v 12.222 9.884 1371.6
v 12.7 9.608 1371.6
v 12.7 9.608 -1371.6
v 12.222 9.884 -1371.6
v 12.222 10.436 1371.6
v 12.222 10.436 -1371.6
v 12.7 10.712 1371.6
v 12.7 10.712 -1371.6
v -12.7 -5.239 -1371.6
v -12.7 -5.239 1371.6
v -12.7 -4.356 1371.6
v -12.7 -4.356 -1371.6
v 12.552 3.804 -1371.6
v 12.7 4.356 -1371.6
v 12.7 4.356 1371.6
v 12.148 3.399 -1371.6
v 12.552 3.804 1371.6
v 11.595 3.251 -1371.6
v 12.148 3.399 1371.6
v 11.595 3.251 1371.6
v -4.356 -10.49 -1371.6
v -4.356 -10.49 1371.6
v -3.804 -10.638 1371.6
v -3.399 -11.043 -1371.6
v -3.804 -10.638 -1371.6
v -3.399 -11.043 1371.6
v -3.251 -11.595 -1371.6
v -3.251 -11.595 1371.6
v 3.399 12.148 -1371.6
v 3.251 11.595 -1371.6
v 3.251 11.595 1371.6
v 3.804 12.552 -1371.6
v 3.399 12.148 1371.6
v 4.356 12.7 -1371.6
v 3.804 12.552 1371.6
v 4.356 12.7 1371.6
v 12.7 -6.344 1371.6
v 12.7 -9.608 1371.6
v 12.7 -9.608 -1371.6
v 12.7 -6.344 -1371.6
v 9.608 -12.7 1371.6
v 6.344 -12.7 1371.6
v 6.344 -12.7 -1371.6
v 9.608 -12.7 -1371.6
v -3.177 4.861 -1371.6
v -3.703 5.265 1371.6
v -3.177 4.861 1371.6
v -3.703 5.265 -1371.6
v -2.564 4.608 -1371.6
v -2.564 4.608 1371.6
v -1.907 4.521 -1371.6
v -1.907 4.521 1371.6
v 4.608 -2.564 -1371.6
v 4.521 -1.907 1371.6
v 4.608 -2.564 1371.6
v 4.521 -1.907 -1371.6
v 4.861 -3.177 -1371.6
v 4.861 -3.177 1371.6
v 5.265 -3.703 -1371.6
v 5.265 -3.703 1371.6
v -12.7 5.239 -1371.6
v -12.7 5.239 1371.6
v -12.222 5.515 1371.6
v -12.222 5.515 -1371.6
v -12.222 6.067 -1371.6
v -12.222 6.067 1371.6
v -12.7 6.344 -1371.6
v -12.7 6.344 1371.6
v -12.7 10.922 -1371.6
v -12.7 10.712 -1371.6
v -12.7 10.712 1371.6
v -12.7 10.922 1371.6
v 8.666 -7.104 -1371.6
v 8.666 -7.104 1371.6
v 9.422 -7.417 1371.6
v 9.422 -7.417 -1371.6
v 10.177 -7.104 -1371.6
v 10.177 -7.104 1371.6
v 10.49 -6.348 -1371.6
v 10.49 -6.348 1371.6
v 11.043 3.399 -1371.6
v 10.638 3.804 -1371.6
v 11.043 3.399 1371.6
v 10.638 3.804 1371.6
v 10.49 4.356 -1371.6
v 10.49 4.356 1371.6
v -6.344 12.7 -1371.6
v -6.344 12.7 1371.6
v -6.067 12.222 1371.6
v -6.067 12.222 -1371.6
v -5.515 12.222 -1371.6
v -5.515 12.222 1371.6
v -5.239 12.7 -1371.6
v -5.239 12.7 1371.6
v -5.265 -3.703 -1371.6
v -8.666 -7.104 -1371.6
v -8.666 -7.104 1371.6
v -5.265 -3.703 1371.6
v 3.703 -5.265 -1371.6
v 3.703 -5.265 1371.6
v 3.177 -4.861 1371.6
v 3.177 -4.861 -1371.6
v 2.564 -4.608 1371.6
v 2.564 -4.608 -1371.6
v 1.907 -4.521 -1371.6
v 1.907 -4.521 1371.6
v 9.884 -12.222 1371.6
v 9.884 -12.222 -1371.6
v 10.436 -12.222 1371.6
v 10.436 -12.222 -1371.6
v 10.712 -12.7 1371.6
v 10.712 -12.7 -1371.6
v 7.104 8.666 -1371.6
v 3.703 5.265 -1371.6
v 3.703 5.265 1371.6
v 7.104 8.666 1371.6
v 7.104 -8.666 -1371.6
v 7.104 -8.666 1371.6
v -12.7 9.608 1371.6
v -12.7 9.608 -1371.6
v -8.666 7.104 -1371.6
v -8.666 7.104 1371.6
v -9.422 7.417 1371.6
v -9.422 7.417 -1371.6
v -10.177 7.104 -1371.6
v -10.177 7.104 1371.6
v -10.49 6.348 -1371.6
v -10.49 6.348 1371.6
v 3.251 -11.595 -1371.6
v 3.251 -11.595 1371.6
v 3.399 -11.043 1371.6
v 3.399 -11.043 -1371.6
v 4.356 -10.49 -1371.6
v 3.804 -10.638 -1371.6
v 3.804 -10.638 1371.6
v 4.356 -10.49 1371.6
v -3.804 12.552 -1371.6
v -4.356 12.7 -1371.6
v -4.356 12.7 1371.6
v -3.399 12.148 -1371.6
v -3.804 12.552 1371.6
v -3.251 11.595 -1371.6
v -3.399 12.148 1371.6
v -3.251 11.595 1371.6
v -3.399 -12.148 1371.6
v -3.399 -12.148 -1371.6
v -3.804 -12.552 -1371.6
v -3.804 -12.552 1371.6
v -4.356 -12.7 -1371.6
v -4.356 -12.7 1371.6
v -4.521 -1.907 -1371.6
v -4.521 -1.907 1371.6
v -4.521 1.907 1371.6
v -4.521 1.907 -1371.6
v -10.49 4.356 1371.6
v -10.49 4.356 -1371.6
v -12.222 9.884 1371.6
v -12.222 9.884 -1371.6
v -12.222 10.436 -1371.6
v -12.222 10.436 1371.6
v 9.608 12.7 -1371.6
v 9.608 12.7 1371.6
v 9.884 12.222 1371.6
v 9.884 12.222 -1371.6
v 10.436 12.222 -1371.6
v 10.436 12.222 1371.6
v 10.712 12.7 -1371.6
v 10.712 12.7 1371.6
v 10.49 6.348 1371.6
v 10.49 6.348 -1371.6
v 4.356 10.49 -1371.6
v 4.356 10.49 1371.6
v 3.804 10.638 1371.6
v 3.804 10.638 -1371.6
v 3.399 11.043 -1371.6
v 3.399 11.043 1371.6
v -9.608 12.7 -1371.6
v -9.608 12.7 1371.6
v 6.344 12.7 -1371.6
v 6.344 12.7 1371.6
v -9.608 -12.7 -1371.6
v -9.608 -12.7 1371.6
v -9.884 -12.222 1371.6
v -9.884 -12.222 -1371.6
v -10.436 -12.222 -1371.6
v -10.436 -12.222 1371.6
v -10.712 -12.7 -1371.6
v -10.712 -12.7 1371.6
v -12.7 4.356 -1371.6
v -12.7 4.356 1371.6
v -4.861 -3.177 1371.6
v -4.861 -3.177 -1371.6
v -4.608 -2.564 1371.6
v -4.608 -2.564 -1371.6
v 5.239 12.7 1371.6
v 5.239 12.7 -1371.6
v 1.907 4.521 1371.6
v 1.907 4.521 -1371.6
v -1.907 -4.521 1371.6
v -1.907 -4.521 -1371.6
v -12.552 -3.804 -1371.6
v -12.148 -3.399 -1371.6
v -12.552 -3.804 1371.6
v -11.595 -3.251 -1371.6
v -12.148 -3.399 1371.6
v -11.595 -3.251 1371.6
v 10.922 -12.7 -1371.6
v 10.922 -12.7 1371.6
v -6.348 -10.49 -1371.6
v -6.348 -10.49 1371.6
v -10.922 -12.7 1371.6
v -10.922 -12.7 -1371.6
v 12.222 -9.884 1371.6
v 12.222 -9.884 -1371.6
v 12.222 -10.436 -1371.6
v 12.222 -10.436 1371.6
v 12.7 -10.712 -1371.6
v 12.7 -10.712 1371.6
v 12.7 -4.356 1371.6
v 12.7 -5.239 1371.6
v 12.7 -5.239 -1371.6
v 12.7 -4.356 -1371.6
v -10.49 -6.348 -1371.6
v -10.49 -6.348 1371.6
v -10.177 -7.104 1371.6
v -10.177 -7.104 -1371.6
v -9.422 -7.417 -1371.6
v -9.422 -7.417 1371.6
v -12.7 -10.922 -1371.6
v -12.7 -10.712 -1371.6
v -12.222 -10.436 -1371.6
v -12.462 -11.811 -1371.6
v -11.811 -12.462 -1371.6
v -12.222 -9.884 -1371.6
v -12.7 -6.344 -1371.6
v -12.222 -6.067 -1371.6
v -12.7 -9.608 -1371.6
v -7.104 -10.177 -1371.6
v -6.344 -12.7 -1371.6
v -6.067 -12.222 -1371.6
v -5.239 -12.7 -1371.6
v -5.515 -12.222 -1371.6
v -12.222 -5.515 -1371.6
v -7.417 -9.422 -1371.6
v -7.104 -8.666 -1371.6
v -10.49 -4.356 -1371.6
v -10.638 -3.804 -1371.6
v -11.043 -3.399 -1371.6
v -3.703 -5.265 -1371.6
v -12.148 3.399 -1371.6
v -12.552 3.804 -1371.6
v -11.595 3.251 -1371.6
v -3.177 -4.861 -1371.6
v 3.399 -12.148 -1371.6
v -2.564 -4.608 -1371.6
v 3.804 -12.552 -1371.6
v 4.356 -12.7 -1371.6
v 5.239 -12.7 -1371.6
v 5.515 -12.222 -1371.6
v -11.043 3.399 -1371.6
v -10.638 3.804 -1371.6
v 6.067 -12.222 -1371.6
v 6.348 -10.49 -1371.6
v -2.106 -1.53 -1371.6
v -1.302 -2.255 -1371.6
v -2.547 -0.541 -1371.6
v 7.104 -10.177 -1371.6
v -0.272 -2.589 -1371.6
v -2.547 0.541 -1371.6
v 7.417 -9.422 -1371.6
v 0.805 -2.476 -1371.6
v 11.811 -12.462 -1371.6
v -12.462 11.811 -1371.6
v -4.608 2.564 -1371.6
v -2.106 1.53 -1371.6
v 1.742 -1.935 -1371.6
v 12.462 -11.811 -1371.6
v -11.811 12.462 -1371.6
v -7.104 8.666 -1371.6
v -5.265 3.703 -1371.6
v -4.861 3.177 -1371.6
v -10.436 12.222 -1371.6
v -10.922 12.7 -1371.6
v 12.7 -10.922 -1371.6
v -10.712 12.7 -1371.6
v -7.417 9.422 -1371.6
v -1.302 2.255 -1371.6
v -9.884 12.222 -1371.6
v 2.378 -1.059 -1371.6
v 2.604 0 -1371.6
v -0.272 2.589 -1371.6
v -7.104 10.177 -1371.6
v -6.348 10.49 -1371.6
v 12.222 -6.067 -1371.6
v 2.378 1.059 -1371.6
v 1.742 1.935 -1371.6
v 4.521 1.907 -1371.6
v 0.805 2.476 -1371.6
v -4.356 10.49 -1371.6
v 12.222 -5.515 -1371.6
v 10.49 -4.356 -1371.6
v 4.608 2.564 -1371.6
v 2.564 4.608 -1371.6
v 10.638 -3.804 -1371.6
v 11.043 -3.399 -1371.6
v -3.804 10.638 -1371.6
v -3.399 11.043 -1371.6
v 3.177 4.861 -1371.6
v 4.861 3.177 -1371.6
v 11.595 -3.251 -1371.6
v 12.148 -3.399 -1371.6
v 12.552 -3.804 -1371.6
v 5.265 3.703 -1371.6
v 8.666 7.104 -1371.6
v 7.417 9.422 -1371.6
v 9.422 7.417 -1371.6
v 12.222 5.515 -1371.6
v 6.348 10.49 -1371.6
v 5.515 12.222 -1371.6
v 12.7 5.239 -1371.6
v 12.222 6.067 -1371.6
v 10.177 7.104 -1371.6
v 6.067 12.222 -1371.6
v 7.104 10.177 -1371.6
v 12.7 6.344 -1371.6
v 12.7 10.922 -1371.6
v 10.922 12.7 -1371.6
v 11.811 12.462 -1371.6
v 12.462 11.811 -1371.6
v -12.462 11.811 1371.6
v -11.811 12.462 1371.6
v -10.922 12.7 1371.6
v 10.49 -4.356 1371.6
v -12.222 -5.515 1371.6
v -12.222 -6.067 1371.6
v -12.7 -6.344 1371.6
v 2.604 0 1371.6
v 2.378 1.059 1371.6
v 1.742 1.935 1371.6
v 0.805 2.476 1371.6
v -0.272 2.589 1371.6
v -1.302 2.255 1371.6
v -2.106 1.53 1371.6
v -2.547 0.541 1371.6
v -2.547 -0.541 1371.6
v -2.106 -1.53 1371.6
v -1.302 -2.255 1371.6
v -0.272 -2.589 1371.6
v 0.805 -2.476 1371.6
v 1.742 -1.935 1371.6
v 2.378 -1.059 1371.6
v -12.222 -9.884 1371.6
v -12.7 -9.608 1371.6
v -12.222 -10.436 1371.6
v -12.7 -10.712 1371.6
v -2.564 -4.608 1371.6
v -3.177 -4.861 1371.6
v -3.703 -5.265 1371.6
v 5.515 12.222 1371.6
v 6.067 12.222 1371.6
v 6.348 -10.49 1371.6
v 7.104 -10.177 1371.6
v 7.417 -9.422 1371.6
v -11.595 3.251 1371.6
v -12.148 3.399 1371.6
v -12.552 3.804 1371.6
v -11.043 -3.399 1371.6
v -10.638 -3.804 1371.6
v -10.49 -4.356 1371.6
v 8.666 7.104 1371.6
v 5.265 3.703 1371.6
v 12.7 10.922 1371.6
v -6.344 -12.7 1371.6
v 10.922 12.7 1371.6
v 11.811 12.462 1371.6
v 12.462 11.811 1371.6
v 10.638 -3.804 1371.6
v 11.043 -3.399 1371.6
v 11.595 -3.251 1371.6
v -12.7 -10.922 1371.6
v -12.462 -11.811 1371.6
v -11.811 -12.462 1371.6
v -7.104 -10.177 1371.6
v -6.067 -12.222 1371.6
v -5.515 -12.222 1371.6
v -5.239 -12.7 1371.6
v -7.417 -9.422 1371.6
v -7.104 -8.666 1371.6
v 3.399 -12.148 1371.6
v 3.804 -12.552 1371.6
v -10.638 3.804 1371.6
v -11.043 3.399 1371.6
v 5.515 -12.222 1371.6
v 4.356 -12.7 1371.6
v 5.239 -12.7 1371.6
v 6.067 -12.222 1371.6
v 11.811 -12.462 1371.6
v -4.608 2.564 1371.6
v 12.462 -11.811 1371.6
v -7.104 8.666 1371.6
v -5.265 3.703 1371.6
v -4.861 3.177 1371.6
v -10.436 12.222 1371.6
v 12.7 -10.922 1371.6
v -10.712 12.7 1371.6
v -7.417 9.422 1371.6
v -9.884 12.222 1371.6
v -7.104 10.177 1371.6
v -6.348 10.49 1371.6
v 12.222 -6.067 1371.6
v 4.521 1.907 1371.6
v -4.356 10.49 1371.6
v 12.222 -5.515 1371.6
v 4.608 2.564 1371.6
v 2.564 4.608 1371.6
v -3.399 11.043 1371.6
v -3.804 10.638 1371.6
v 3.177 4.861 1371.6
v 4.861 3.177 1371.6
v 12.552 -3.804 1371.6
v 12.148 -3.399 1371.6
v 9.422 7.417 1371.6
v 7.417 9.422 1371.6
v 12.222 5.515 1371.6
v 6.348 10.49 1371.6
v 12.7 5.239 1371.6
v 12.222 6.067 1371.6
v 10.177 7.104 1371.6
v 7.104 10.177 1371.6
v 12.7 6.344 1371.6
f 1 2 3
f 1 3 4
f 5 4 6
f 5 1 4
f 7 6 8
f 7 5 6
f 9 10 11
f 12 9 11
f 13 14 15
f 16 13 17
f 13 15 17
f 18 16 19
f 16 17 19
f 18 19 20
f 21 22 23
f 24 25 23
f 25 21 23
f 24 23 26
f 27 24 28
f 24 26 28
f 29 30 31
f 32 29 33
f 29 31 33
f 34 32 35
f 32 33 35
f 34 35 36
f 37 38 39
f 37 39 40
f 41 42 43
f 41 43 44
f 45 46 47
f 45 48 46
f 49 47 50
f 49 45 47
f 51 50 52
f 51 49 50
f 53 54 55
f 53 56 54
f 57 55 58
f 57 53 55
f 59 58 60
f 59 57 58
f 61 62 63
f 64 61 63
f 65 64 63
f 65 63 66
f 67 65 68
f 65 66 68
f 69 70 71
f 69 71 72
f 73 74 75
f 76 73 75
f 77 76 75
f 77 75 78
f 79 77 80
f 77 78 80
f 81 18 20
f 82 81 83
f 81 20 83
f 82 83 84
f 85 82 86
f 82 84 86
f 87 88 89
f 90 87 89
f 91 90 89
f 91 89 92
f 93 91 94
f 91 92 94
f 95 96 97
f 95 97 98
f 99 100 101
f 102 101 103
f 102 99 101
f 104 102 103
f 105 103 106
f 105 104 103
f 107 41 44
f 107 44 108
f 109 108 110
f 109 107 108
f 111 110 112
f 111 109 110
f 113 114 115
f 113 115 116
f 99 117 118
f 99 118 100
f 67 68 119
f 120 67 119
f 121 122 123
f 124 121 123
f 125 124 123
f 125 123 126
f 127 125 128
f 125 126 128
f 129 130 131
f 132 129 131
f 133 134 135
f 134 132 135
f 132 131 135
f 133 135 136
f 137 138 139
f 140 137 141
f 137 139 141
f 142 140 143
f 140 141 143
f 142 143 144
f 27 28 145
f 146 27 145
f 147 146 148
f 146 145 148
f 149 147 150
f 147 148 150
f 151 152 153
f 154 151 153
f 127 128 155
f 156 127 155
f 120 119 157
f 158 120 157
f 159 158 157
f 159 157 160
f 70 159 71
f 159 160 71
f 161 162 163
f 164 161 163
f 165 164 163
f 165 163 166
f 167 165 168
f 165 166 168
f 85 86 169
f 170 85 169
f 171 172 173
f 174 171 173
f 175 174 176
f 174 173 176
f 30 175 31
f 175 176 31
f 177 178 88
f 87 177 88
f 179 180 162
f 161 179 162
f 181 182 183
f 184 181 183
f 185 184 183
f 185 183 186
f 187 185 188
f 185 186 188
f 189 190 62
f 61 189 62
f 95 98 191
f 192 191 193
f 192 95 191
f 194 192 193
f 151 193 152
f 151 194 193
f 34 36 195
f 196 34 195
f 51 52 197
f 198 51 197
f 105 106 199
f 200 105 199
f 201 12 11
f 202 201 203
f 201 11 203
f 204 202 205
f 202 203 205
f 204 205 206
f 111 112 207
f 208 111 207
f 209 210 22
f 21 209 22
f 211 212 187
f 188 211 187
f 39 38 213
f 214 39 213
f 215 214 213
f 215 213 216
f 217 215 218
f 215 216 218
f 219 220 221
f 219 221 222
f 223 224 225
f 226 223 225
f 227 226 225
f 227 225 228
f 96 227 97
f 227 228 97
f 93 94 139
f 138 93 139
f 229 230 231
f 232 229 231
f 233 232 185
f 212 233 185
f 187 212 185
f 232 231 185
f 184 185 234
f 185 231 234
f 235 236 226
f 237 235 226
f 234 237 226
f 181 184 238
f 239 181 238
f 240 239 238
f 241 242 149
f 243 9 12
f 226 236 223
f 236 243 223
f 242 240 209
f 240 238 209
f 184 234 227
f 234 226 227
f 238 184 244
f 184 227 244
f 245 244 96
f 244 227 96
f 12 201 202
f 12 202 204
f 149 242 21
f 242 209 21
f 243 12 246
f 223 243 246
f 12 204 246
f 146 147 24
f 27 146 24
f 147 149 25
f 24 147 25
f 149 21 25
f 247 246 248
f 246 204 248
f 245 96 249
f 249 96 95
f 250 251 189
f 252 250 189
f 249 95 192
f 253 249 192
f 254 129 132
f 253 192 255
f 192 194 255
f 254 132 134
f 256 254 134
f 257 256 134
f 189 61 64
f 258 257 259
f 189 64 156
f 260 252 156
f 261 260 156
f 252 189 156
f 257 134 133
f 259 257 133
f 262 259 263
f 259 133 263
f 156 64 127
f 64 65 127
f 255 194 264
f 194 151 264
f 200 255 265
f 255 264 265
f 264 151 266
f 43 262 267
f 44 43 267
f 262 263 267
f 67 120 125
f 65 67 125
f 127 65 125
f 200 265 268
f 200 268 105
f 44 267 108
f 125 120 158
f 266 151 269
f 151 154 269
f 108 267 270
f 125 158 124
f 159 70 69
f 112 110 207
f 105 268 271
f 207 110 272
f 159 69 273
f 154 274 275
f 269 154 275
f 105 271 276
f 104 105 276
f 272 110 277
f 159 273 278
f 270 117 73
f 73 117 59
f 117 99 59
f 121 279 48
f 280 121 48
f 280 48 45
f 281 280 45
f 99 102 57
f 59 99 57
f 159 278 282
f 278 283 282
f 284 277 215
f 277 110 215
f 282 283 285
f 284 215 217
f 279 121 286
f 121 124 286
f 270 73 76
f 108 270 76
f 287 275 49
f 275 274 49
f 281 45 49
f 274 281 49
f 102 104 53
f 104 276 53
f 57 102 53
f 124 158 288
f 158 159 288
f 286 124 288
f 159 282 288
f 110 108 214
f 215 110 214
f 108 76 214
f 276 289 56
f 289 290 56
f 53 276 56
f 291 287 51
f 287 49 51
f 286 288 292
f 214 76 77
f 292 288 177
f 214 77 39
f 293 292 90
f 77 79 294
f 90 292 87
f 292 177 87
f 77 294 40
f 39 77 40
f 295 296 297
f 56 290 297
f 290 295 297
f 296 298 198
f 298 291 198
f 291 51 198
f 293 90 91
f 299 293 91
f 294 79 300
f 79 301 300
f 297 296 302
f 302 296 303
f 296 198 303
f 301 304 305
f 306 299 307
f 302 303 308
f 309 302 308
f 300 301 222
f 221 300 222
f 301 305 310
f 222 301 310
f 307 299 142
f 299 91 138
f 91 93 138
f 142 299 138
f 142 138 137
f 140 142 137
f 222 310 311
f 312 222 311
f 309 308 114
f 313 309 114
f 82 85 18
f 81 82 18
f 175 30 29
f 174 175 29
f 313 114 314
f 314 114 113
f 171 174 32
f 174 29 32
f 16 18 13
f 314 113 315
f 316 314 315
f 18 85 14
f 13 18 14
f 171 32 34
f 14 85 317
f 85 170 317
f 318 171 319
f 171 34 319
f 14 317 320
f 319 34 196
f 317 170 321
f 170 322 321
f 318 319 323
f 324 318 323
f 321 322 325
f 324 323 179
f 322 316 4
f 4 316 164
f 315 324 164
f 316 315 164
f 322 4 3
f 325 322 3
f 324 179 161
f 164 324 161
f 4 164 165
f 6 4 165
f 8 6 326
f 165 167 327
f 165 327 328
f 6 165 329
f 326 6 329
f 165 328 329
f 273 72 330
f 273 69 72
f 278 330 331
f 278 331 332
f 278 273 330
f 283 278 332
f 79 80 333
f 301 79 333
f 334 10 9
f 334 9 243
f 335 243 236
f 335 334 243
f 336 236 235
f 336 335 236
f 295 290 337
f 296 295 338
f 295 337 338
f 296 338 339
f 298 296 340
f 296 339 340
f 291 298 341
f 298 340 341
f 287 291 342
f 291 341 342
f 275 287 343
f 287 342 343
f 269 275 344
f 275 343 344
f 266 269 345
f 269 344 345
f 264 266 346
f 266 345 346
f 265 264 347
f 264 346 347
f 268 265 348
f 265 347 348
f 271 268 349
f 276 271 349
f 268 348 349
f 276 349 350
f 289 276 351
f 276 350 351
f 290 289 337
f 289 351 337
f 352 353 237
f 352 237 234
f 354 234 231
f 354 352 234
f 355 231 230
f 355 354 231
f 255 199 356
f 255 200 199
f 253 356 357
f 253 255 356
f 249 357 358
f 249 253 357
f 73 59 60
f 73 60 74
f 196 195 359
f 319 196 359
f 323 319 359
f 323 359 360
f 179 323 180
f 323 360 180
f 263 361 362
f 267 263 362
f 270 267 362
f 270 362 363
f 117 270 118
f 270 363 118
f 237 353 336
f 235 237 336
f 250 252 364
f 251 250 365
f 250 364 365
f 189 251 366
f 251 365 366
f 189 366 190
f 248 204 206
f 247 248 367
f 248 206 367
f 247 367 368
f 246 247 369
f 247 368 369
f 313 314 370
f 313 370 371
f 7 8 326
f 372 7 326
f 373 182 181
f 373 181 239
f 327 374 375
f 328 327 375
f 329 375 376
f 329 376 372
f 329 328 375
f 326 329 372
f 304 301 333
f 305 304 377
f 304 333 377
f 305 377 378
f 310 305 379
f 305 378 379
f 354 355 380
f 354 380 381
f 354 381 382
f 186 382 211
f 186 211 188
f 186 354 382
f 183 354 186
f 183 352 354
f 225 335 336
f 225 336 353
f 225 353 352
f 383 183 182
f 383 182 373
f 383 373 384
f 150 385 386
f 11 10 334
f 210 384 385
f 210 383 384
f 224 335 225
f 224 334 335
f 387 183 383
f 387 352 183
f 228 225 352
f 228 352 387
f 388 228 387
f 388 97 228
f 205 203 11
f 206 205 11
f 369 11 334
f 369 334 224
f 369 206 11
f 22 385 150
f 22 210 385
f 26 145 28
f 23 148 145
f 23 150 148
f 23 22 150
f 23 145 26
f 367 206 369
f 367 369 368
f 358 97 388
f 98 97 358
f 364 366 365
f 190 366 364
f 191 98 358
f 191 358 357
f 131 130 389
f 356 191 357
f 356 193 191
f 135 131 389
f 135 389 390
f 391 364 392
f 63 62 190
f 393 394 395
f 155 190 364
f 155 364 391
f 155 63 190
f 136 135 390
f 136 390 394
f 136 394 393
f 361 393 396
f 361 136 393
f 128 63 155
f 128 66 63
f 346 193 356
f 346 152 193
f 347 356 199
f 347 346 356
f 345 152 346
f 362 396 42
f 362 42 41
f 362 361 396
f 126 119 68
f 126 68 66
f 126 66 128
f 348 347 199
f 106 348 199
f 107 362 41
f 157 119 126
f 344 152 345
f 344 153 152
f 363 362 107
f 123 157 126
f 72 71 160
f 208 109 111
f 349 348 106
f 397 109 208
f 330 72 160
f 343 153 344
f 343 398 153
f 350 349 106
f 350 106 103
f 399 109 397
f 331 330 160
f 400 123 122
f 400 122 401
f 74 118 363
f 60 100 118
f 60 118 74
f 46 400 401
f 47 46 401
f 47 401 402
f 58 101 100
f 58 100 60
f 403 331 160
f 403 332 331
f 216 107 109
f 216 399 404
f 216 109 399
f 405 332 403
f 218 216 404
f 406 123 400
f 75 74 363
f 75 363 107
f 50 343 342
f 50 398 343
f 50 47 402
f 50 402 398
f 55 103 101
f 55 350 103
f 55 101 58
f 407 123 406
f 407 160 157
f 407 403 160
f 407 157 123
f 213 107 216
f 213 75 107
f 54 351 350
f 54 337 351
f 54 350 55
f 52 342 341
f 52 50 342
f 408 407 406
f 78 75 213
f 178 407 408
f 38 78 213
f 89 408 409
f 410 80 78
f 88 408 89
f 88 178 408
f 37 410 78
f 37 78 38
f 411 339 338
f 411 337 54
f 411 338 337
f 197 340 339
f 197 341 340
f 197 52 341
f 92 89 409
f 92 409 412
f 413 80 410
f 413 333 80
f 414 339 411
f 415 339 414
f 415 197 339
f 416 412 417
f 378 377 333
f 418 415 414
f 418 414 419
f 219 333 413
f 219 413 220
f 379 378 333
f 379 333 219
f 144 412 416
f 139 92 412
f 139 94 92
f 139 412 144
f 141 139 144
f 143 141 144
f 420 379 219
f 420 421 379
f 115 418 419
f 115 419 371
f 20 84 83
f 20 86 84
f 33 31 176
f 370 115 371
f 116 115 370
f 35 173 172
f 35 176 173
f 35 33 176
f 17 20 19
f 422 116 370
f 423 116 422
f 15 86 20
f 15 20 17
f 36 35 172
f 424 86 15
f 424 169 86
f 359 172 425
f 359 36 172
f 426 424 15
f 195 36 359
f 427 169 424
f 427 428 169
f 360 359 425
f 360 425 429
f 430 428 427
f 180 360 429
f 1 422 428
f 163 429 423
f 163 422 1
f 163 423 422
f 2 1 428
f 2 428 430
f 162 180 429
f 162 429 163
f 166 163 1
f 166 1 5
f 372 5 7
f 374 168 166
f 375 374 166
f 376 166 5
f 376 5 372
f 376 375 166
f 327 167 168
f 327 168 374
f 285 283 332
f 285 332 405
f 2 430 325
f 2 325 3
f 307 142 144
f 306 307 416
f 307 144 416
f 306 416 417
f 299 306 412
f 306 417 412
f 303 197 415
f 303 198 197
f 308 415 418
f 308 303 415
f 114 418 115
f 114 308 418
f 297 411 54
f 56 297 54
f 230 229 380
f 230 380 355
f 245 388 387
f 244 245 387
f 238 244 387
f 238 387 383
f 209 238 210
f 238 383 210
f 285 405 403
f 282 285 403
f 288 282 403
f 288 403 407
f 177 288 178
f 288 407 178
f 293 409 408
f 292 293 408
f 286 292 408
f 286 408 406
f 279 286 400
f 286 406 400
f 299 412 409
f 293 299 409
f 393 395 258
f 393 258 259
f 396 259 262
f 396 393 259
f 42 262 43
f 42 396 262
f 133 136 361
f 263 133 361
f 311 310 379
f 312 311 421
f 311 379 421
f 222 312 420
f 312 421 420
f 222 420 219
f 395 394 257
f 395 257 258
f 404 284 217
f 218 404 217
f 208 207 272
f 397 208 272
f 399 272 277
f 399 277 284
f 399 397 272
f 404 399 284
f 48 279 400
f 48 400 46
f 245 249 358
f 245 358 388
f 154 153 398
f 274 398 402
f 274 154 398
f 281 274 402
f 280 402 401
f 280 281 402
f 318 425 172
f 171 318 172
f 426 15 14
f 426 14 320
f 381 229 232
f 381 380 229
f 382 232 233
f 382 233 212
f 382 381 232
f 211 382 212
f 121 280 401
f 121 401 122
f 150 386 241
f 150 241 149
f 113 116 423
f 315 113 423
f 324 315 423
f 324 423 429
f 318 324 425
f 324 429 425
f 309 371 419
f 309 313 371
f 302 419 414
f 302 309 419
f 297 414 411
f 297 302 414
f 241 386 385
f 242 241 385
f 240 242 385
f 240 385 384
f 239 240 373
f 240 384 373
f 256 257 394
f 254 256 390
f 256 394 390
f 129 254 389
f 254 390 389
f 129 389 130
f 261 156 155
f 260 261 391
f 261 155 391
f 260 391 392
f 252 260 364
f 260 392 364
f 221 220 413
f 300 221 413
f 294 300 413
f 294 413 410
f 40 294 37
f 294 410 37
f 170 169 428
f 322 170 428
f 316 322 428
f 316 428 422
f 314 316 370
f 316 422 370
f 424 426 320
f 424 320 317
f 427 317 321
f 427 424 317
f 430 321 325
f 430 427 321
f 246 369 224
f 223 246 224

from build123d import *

# Parameters (mm, degrees)
SKETCH3_W                = 25.4
SKETCH3_H                = 25.4
BOSS_EXTRUDE1_DEPTH      = 1371.6
BOSS_EXTRUDE1_DEPTH_BACK = 1371.6
SKETCH4_R                = 2.6035
CUT_EXTRUDE1_DEPTH       = 2744.2
CUT_EXTRUDE2_DEPTH       = 2744.2
FILLET1_R                = 2.54
FILLET2_R                = 1.778


with BuildPart() as part:
    # Sketch3 → Boss-Extrude1 (new body, two sides)
    with BuildSketch(Plane.XY) as boss_extrude1_sk:
        Rectangle(SKETCH3_W, SKETCH3_H)
    extrude(amount=BOSS_EXTRUDE1_DEPTH)
    extrude(boss_extrude1_sk.sketch, amount=-BOSS_EXTRUDE1_DEPTH_BACK)

    # Sketch4 → Cut-Extrude1 (cut, through all)
    with BuildSketch(Plane.XY.offset(1371.6)):
        with BuildLine():
            Line((3.2512, 12.7), (-3.2512, 12.7))
            Line((-3.2512, 12.7), (-3.2512, 10.4902))
            Line((-3.2512, 10.4902), (-6.348478019, 10.4902))
            ThreePointArc((-6.348478019, 10.4902), (-7.335478831, 9.830707141), (-7.103895736, 8.666460301))
            Line((-7.103895736, 8.666460301), (-2.958635435, 4.5212))
            Line((-2.958635435, 4.5212), (2.958635435, 4.5212))
            Line((2.958635435, 4.5212), (7.103895736, 8.666460301))
            ThreePointArc((7.103895736, 8.666460301), (7.335478831, 9.830707141), (6.348478019, 10.4902))
            Line((6.348478019, 10.4902), (3.2512, 10.4902))
            Line((3.2512, 10.4902), (3.2512, 12.7))
        make_face()
        with BuildLine():
            Line((12.7, -3.2512), (12.7, 3.2512))
            Line((12.7, 3.2512), (10.4902, 3.2512))
            Line((10.4902, 3.2512), (10.4902, 6.348478019))
            ThreePointArc((10.4902, 6.348478019), (9.830707141, 7.335478831), (8.666460301, 7.103895736))
            Line((8.666460301, 7.103895736), (4.5212, 2.958635435))
            Line((4.5212, 2.958635435), (4.5212, -2.958635435))
            Line((4.5212, -2.958635435), (8.666460301, -7.103895736))
            ThreePointArc((8.666460301, -7.103895736), (9.830707141, -7.335478831), (10.4902, -6.348478019))
            Line((10.4902, -6.348478019), (10.4902, -3.2512))
            Line((10.4902, -3.2512), (12.7, -3.2512))
        make_face()
        with BuildLine():
            Line((-3.2512, -10.4902), (-3.2512, -12.7))
            Line((-3.2512, -12.7), (3.2512, -12.7))
            Line((3.2512, -12.7), (3.2512, -10.4902))
            Line((3.2512, -10.4902), (6.348478019, -10.4902))
            ThreePointArc((6.348478019, -10.4902), (7.335478831, -9.830707141), (7.103895736, -8.666460301))
            Line((7.103895736, -8.666460301), (2.958635435, -4.5212))
            Line((2.958635435, -4.5212), (-2.958635435, -4.5212))
            Line((-2.958635435, -4.5212), (-7.103895736, -8.666460301))
            ThreePointArc((-7.103895736, -8.666460301), (-7.335478831, -9.830707141), (-6.348478019, -10.4902))
            Line((-6.348478019, -10.4902), (-3.2512, -10.4902))
        make_face()
        with BuildLine():
            Line((-10.4902, 3.2512), (-12.7, 3.2512))
            Line((-12.7, 3.2512), (-12.7, -3.2512))
            Line((-12.7, -3.2512), (-10.4902, -3.2512))
            Line((-10.4902, -3.2512), (-10.4902, -6.348478019))
            ThreePointArc((-10.4902, -6.348478019), (-9.830707141, -7.335478831), (-8.666460301, -7.103895736))
            Line((-8.666460301, -7.103895736), (-4.5212, -2.958635435))
            Line((-4.5212, -2.958635435), (-4.5212, 2.958635435))
            Line((-4.5212, 2.958635435), (-8.666460301, 7.103895736))
            ThreePointArc((-8.666460301, 7.103895736), (-9.830707141, 7.335478831), (-10.4902, 6.348478019))
            Line((-10.4902, 6.348478019), (-10.4902, 3.2512))
        make_face()
        Circle(SKETCH4_R)
    extrude(amount=-CUT_EXTRUDE1_DEPTH, mode=Mode.SUBTRACT)

    # Sketch5 → Cut-Extrude2 (cut, through all)
    with BuildSketch(Plane.XY.offset(1371.6)):
        with BuildLine():
            ThreePointArc((-11.5951, 3.2512), (-12.376382283, 3.574817717), (-12.7, 4.3561))
            Line((-12.7, 4.3561), (-12.7, 3.2512))
            Line((-12.7, 3.2512), (-11.5951, 3.2512))
        make_face()
        with BuildLine():
            ThreePointArc((-10.4902, 4.3561), (-10.813817717, 3.574817717), (-11.5951, 3.2512))
            Line((-11.5951, 3.2512), (-10.4902, 3.2512))
            Line((-10.4902, 3.2512), (-10.4902, 4.3561))
        make_face()
        with BuildLine():
            Line((-12.7, -3.2512), (-12.7, -4.3561))
            ThreePointArc((-12.7, -4.3561), (-12.376382283, -3.574817717), (-11.5951, -3.2512))
            Line((-11.5951, -3.2512), (-12.7, -3.2512))
        make_face()
        with BuildLine():
            Line((-10.4902, -3.2512), (-11.5951, -3.2512))
            ThreePointArc((-11.5951, -3.2512), (-10.813817717, -3.574817717), (-10.4902, -4.3561))
            Line((-10.4902, -4.3561), (-10.4902, -3.2512))
        make_face()
        with BuildLine():
            Line((-3.2512, -11.595100007), (-3.2512, -10.4902))
            Line((-3.2512, -10.4902), (-4.3561, -10.4902))
            ThreePointArc((-4.3561, -10.4902), (-3.574817715, -10.81381772), (-3.2512, -11.595100007))
        make_face()
        with BuildLine():
            Line((-3.2512, -12.7), (-3.2512, -11.595100007))
            ThreePointArc((-3.2512, -11.595100007), (-3.57481772, -12.376382285), (-4.3561, -12.7))
            Line((-4.3561, -12.7), (-3.2512, -12.7))
        make_face()
        with BuildLine():
            Line((3.2512, -10.4902), (3.2512, -11.5951))
            ThreePointArc((3.2512, -11.5951), (3.574817718, -10.813817717), (4.3561, -10.4902))
            Line((4.3561, -10.4902), (3.2512, -10.4902))
        make_face()
        with BuildLine():
            Line((3.2512, -12.7), (4.3561, -12.7))
            ThreePointArc((4.3561, -12.7), (3.574817717, -12.376382282), (3.2512, -11.5951))
            Line((3.2512, -11.5951), (3.2512, -12.7))
        make_face()
        with BuildLine():
            Line((11.5951, -3.2512), (10.4902, -3.2512))
            Line((10.4902, -3.2512), (10.4902, -4.3561))
            ThreePointArc((10.4902, -4.3561), (10.813817717, -3.574817717), (11.5951, -3.2512))
        make_face()
        with BuildLine():
            Line((12.7, -3.2512), (11.5951, -3.2512))
            ThreePointArc((11.5951, -3.2512), (12.376382283, -3.574817717), (12.7, -4.3561))
            Line((12.7, -4.3561), (12.7, -3.2512))
        make_face()
        with BuildLine():
            Line((10.4902, 3.2512), (11.5951, 3.2512))
            ThreePointArc((11.5951, 3.2512), (10.813817717, 3.574817717), (10.4902, 4.3561))
            Line((10.4902, 4.3561), (10.4902, 3.2512))
        make_face()
        with BuildLine():
            Line((12.7, 3.2512), (12.7, 4.3561))
            ThreePointArc((12.7, 4.3561), (12.376382283, 3.574817717), (11.5951, 3.2512))
            Line((11.5951, 3.2512), (12.7, 3.2512))
        make_face()
        with BuildLine():
            Line((3.2512, 12.7), (3.2512, 11.595099996))
            ThreePointArc((3.2512, 11.595099996), (3.574817716, 12.376382281), (4.3561, 12.7))
            Line((4.3561, 12.7), (3.2512, 12.7))
        make_face()
        with BuildLine():
            Line((3.2512, 11.595099996), (3.2512, 10.4902))
            Line((3.2512, 10.4902), (4.3561, 10.4902))
            ThreePointArc((4.3561, 10.4902), (3.574817719, 10.813817716), (3.2512, 11.595099996))
        make_face()
        with BuildLine():
            Line((-3.2512, 12.7), (-4.3561, 12.7))
            ThreePointArc((-4.3561, 12.7), (-3.574817717, 12.376382283), (-3.2512, 11.5951))
            Line((-3.2512, 11.5951), (-3.2512, 12.7))
        make_face()
        with BuildLine():
            Line((-3.2512, 10.4902), (-3.2512, 11.5951))
            ThreePointArc((-3.2512, 11.5951), (-3.574817717, 10.813817717), (-4.3561, 10.4902))
            Line((-4.3561, 10.4902), (-3.2512, 10.4902))
        make_face()
        with BuildLine():
            ThreePointArc((-12.7, 5.23875), (-12.14755, 5.7912), (-12.7, 6.34365))
            Line((-12.7, 6.34365), (-12.7, 5.23875))
        make_face()
        with BuildLine():
            ThreePointArc((-12.7, 9.60755), (-12.14755, 10.16), (-12.7, 10.71245))
            Line((-12.7, 10.71245), (-12.7, 9.60755))
        make_face()
        with BuildLine():
            ThreePointArc((-10.71245, 12.7), (-10.16, 12.14755), (-9.60755, 12.7))
            Line((-9.60755, 12.7), (-10.71245, 12.7))
        make_face()
        with BuildLine():
            ThreePointArc((-6.34365, 12.7), (-5.7912, 12.14755), (-5.23875, 12.7))
            Line((-5.23875, 12.7), (-6.34365, 12.7))
        make_face()
        with BuildLine():
            Line((6.34365, 12.7), (5.23875, 12.7))
            ThreePointArc((5.23875, 12.7), (5.7912, 12.14755), (6.34365, 12.7))
        make_face()
        with BuildLine():
            Line((10.71245, 12.7), (9.60755, 12.7))
            ThreePointArc((9.60755, 12.7), (10.16, 12.14755), (10.71245, 12.7))
        make_face()
        with BuildLine():
            Line((12.7, 10.71245), (12.7, 9.60755))
            ThreePointArc((12.7, 9.60755), (12.14755, 10.16), (12.7, 10.71245))
        make_face()
        with BuildLine():
            Line((12.7, 6.34365), (12.7, 5.23875))
            ThreePointArc((12.7, 5.23875), (12.14755, 5.7912), (12.7, 6.34365))
        make_face()
        with BuildLine():
            Line((-12.7, -6.34365), (-12.7, -5.23875))
            ThreePointArc((-12.7, -5.23875), (-12.14755, -5.7912), (-12.7, -6.34365))
        make_face()
        with BuildLine():
            Line((-12.7, -10.71245), (-12.7, -9.60755))
            ThreePointArc((-12.7, -9.60755), (-12.14755, -10.16), (-12.7, -10.71245))
        make_face()
        with BuildLine():
            Line((-10.71245, -12.7), (-9.60755, -12.7))
            ThreePointArc((-9.60755, -12.7), (-10.16, -12.14755), (-10.71245, -12.7))
        make_face()
        with BuildLine():
            Line((-6.34365, -12.7), (-5.23875, -12.7))
            ThreePointArc((-5.23875, -12.7), (-5.7912, -12.14755), (-6.34365, -12.7))
        make_face()
        with BuildLine():
            Line((12.7, -10.71245), (12.7, -9.60755))
            ThreePointArc((12.7, -9.60755), (12.14755, -10.16), (12.7, -10.71245))
        make_face()
        with BuildLine():
            Line((12.7, -6.34365), (12.7, -5.23875))
            ThreePointArc((12.7, -5.23875), (12.14755, -5.7912), (12.7, -6.34365))
        make_face()
        with BuildLine():
            Line((10.71245, -12.7), (9.60755, -12.7))
            ThreePointArc((9.60755, -12.7), (10.16, -12.14755), (10.71245, -12.7))
        make_face()
        with BuildLine():
            Line((6.34365, -12.7), (5.23875, -12.7))
            ThreePointArc((5.23875, -12.7), (5.7912, -12.14755), (6.34365, -12.7))
        make_face()
    extrude(amount=-CUT_EXTRUDE2_DEPTH, mode=Mode.SUBTRACT)

    # Fillet1
    fillet1_edges = [part.edges().sort_by_distance(p)[0] for p in [
        (2.958635435, 4.5212, 0),
        (-2.958635435, 4.5212, 0),
        (-2.958635435, -4.5212, 0),
        (2.958635435, -4.5212, 0),
        (4.5212, -2.958635435, 0),
        (4.5212, 2.958635435, 0),
        (-4.5212, 2.958635435, 0),
        (-4.5212, -2.958635435, 0),
    ]]
    fillet(fillet1_edges, radius=FILLET1_R)

    # Fillet2
    fillet2_edges = [part.edges().sort_by_distance(p)[0] for p in [
        (-12.7, 12.7, 0),
        (12.7, 12.7, 0),
        (12.7, -12.7, 0),
        (-12.7, -12.7, 0),
    ]]
    fillet(fillet2_edges, radius=FILLET2_R)


solid = part.part
